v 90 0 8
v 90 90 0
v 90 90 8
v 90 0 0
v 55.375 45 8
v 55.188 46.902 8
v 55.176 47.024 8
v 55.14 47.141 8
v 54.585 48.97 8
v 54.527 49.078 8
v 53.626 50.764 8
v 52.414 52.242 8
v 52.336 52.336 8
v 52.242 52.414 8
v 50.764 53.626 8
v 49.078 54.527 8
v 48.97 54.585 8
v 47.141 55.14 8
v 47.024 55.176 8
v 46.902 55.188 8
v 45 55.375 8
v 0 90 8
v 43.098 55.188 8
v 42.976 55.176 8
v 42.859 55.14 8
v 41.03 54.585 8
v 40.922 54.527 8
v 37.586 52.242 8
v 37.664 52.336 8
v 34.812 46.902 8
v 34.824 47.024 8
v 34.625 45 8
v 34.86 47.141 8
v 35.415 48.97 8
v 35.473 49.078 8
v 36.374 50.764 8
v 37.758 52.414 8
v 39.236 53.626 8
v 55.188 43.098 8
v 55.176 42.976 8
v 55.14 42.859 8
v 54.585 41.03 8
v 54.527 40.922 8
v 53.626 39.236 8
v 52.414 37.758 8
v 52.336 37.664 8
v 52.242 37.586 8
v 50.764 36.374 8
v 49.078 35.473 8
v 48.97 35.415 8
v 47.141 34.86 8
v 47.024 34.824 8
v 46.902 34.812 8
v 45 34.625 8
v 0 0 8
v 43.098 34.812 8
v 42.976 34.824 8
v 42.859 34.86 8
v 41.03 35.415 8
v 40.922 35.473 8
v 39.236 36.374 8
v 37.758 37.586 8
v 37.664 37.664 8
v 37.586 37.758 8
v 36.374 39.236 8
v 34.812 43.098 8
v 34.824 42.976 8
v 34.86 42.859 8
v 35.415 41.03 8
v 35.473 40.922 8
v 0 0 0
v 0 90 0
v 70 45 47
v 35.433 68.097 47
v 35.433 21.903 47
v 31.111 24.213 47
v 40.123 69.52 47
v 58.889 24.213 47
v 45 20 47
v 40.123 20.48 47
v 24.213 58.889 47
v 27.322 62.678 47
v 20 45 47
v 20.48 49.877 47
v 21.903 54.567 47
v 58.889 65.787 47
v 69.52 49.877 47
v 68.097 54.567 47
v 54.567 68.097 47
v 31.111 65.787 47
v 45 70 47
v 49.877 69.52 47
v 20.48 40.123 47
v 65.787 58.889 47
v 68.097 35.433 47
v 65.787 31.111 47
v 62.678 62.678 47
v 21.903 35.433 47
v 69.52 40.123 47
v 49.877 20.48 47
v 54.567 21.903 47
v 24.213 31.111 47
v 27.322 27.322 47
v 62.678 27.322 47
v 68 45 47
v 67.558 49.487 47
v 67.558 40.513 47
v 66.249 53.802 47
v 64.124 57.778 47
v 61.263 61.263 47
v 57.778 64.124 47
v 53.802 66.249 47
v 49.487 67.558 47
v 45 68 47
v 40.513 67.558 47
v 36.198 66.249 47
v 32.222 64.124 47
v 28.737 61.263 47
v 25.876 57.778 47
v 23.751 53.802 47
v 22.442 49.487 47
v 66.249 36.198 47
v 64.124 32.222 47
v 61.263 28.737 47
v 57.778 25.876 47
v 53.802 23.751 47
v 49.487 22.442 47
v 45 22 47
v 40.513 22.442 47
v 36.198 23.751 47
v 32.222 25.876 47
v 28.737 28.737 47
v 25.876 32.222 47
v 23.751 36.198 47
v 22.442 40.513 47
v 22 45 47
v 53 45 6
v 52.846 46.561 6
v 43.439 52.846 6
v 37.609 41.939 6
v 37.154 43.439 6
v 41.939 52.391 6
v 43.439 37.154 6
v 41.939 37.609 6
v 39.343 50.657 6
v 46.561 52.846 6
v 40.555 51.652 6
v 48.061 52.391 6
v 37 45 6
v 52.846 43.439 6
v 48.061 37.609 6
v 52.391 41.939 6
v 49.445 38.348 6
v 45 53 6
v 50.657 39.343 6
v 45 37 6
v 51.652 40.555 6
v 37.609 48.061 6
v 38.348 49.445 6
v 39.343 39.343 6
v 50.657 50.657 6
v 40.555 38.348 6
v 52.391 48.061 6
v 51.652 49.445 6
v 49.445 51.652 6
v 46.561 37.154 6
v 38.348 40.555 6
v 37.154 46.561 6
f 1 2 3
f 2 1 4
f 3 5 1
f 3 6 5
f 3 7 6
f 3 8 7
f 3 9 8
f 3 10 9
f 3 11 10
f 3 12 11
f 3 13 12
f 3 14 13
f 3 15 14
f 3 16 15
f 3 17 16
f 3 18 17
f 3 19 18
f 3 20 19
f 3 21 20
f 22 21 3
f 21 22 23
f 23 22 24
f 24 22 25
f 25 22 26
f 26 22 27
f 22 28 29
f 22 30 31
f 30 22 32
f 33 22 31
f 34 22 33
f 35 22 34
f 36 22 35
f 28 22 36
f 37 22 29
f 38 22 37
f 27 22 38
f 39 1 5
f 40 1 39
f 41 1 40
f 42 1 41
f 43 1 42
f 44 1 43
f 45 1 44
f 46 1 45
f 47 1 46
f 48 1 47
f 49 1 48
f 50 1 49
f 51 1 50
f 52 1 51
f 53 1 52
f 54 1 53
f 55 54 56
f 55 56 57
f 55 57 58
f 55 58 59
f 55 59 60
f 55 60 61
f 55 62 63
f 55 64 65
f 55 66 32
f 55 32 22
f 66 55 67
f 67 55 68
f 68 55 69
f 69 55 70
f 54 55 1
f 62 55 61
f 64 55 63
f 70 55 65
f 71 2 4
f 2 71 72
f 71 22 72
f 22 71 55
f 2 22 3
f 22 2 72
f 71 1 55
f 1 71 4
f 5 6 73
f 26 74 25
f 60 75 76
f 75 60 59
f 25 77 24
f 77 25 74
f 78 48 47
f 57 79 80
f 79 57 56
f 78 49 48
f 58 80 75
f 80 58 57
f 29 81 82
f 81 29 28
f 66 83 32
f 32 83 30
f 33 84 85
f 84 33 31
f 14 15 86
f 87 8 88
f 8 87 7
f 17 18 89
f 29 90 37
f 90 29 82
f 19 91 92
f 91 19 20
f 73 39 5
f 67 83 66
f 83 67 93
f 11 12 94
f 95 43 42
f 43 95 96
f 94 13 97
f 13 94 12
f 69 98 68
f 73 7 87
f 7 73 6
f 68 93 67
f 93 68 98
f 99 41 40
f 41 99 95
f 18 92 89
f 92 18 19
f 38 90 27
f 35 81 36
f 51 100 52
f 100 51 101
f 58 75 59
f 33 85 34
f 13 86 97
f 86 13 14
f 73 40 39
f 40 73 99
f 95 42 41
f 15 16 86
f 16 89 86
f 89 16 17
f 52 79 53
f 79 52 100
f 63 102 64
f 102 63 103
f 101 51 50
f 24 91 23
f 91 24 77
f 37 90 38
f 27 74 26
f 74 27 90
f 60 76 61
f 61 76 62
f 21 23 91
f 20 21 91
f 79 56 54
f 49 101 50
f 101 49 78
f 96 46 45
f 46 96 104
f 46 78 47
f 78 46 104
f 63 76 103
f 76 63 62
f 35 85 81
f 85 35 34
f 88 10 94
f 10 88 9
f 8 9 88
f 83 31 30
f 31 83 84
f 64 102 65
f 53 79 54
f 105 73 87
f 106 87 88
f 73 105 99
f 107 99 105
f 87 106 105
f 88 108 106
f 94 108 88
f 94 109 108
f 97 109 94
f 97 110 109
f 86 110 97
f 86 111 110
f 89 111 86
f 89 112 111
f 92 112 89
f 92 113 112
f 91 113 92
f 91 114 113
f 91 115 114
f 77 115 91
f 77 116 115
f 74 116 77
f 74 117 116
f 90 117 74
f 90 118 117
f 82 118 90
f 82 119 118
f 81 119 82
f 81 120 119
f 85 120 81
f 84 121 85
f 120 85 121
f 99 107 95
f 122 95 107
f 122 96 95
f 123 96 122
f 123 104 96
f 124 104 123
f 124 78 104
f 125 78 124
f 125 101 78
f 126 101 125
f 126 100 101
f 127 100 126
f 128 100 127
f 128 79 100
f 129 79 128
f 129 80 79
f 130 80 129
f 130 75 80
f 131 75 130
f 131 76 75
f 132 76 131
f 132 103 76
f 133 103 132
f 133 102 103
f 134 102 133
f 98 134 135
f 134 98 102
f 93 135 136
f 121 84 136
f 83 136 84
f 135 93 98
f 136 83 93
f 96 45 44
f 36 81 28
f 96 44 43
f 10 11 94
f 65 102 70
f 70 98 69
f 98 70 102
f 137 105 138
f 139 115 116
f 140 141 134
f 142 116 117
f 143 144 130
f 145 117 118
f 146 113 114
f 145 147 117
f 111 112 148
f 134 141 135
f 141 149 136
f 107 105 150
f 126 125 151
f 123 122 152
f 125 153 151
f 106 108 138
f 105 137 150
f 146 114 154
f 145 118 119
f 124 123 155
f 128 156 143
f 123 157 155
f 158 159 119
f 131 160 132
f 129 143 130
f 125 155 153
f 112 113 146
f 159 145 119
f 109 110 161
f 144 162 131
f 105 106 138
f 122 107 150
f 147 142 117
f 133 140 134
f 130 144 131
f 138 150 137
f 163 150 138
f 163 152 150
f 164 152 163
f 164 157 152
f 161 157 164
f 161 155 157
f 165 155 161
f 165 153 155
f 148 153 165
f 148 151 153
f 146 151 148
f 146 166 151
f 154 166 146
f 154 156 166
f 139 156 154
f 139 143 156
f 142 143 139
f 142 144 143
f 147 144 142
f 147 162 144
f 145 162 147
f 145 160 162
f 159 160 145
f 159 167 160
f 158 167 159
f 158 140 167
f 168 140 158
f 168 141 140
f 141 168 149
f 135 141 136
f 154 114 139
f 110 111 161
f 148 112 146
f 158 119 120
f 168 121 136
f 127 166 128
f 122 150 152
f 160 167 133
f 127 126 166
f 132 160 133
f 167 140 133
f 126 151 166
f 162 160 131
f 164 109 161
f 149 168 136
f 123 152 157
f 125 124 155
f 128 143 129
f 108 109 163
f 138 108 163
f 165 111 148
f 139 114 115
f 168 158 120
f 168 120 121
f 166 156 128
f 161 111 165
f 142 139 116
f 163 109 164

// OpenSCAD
$fn = 32;

// ----------------------------------------------------------------------
// Hopper: funnel with square flange
// ----------------------------------------------------------------------

// --- parameters (mm) ---
fl = 90;                  // flange side, X and Y
fl_t = 8;                 // flange thickness
cone_h = 40;              // cone height above the flange
top_d = 50;               // cone mouth diameter
bot_d = 20;               // cone spout diameter
wall = 2;                 // cone wall thickness

bore_d = bot_d - 2 * wall;  // spout bore diameter
total_h = fl_t + cone_h - 1;  // overall height

difference() {
  union() {
    cube([fl, fl, fl_t]);
    translate([fl / 2, fl / 2, fl_t - 1])
      cylinder(h = cone_h, d1 = bot_d, d2 = top_d);
  }
  translate([fl / 2, fl / 2, fl_t - 2])
    cylinder(h = cone_h + 1, d1 = bore_d, d2 = top_d - 2 * wall);
}
